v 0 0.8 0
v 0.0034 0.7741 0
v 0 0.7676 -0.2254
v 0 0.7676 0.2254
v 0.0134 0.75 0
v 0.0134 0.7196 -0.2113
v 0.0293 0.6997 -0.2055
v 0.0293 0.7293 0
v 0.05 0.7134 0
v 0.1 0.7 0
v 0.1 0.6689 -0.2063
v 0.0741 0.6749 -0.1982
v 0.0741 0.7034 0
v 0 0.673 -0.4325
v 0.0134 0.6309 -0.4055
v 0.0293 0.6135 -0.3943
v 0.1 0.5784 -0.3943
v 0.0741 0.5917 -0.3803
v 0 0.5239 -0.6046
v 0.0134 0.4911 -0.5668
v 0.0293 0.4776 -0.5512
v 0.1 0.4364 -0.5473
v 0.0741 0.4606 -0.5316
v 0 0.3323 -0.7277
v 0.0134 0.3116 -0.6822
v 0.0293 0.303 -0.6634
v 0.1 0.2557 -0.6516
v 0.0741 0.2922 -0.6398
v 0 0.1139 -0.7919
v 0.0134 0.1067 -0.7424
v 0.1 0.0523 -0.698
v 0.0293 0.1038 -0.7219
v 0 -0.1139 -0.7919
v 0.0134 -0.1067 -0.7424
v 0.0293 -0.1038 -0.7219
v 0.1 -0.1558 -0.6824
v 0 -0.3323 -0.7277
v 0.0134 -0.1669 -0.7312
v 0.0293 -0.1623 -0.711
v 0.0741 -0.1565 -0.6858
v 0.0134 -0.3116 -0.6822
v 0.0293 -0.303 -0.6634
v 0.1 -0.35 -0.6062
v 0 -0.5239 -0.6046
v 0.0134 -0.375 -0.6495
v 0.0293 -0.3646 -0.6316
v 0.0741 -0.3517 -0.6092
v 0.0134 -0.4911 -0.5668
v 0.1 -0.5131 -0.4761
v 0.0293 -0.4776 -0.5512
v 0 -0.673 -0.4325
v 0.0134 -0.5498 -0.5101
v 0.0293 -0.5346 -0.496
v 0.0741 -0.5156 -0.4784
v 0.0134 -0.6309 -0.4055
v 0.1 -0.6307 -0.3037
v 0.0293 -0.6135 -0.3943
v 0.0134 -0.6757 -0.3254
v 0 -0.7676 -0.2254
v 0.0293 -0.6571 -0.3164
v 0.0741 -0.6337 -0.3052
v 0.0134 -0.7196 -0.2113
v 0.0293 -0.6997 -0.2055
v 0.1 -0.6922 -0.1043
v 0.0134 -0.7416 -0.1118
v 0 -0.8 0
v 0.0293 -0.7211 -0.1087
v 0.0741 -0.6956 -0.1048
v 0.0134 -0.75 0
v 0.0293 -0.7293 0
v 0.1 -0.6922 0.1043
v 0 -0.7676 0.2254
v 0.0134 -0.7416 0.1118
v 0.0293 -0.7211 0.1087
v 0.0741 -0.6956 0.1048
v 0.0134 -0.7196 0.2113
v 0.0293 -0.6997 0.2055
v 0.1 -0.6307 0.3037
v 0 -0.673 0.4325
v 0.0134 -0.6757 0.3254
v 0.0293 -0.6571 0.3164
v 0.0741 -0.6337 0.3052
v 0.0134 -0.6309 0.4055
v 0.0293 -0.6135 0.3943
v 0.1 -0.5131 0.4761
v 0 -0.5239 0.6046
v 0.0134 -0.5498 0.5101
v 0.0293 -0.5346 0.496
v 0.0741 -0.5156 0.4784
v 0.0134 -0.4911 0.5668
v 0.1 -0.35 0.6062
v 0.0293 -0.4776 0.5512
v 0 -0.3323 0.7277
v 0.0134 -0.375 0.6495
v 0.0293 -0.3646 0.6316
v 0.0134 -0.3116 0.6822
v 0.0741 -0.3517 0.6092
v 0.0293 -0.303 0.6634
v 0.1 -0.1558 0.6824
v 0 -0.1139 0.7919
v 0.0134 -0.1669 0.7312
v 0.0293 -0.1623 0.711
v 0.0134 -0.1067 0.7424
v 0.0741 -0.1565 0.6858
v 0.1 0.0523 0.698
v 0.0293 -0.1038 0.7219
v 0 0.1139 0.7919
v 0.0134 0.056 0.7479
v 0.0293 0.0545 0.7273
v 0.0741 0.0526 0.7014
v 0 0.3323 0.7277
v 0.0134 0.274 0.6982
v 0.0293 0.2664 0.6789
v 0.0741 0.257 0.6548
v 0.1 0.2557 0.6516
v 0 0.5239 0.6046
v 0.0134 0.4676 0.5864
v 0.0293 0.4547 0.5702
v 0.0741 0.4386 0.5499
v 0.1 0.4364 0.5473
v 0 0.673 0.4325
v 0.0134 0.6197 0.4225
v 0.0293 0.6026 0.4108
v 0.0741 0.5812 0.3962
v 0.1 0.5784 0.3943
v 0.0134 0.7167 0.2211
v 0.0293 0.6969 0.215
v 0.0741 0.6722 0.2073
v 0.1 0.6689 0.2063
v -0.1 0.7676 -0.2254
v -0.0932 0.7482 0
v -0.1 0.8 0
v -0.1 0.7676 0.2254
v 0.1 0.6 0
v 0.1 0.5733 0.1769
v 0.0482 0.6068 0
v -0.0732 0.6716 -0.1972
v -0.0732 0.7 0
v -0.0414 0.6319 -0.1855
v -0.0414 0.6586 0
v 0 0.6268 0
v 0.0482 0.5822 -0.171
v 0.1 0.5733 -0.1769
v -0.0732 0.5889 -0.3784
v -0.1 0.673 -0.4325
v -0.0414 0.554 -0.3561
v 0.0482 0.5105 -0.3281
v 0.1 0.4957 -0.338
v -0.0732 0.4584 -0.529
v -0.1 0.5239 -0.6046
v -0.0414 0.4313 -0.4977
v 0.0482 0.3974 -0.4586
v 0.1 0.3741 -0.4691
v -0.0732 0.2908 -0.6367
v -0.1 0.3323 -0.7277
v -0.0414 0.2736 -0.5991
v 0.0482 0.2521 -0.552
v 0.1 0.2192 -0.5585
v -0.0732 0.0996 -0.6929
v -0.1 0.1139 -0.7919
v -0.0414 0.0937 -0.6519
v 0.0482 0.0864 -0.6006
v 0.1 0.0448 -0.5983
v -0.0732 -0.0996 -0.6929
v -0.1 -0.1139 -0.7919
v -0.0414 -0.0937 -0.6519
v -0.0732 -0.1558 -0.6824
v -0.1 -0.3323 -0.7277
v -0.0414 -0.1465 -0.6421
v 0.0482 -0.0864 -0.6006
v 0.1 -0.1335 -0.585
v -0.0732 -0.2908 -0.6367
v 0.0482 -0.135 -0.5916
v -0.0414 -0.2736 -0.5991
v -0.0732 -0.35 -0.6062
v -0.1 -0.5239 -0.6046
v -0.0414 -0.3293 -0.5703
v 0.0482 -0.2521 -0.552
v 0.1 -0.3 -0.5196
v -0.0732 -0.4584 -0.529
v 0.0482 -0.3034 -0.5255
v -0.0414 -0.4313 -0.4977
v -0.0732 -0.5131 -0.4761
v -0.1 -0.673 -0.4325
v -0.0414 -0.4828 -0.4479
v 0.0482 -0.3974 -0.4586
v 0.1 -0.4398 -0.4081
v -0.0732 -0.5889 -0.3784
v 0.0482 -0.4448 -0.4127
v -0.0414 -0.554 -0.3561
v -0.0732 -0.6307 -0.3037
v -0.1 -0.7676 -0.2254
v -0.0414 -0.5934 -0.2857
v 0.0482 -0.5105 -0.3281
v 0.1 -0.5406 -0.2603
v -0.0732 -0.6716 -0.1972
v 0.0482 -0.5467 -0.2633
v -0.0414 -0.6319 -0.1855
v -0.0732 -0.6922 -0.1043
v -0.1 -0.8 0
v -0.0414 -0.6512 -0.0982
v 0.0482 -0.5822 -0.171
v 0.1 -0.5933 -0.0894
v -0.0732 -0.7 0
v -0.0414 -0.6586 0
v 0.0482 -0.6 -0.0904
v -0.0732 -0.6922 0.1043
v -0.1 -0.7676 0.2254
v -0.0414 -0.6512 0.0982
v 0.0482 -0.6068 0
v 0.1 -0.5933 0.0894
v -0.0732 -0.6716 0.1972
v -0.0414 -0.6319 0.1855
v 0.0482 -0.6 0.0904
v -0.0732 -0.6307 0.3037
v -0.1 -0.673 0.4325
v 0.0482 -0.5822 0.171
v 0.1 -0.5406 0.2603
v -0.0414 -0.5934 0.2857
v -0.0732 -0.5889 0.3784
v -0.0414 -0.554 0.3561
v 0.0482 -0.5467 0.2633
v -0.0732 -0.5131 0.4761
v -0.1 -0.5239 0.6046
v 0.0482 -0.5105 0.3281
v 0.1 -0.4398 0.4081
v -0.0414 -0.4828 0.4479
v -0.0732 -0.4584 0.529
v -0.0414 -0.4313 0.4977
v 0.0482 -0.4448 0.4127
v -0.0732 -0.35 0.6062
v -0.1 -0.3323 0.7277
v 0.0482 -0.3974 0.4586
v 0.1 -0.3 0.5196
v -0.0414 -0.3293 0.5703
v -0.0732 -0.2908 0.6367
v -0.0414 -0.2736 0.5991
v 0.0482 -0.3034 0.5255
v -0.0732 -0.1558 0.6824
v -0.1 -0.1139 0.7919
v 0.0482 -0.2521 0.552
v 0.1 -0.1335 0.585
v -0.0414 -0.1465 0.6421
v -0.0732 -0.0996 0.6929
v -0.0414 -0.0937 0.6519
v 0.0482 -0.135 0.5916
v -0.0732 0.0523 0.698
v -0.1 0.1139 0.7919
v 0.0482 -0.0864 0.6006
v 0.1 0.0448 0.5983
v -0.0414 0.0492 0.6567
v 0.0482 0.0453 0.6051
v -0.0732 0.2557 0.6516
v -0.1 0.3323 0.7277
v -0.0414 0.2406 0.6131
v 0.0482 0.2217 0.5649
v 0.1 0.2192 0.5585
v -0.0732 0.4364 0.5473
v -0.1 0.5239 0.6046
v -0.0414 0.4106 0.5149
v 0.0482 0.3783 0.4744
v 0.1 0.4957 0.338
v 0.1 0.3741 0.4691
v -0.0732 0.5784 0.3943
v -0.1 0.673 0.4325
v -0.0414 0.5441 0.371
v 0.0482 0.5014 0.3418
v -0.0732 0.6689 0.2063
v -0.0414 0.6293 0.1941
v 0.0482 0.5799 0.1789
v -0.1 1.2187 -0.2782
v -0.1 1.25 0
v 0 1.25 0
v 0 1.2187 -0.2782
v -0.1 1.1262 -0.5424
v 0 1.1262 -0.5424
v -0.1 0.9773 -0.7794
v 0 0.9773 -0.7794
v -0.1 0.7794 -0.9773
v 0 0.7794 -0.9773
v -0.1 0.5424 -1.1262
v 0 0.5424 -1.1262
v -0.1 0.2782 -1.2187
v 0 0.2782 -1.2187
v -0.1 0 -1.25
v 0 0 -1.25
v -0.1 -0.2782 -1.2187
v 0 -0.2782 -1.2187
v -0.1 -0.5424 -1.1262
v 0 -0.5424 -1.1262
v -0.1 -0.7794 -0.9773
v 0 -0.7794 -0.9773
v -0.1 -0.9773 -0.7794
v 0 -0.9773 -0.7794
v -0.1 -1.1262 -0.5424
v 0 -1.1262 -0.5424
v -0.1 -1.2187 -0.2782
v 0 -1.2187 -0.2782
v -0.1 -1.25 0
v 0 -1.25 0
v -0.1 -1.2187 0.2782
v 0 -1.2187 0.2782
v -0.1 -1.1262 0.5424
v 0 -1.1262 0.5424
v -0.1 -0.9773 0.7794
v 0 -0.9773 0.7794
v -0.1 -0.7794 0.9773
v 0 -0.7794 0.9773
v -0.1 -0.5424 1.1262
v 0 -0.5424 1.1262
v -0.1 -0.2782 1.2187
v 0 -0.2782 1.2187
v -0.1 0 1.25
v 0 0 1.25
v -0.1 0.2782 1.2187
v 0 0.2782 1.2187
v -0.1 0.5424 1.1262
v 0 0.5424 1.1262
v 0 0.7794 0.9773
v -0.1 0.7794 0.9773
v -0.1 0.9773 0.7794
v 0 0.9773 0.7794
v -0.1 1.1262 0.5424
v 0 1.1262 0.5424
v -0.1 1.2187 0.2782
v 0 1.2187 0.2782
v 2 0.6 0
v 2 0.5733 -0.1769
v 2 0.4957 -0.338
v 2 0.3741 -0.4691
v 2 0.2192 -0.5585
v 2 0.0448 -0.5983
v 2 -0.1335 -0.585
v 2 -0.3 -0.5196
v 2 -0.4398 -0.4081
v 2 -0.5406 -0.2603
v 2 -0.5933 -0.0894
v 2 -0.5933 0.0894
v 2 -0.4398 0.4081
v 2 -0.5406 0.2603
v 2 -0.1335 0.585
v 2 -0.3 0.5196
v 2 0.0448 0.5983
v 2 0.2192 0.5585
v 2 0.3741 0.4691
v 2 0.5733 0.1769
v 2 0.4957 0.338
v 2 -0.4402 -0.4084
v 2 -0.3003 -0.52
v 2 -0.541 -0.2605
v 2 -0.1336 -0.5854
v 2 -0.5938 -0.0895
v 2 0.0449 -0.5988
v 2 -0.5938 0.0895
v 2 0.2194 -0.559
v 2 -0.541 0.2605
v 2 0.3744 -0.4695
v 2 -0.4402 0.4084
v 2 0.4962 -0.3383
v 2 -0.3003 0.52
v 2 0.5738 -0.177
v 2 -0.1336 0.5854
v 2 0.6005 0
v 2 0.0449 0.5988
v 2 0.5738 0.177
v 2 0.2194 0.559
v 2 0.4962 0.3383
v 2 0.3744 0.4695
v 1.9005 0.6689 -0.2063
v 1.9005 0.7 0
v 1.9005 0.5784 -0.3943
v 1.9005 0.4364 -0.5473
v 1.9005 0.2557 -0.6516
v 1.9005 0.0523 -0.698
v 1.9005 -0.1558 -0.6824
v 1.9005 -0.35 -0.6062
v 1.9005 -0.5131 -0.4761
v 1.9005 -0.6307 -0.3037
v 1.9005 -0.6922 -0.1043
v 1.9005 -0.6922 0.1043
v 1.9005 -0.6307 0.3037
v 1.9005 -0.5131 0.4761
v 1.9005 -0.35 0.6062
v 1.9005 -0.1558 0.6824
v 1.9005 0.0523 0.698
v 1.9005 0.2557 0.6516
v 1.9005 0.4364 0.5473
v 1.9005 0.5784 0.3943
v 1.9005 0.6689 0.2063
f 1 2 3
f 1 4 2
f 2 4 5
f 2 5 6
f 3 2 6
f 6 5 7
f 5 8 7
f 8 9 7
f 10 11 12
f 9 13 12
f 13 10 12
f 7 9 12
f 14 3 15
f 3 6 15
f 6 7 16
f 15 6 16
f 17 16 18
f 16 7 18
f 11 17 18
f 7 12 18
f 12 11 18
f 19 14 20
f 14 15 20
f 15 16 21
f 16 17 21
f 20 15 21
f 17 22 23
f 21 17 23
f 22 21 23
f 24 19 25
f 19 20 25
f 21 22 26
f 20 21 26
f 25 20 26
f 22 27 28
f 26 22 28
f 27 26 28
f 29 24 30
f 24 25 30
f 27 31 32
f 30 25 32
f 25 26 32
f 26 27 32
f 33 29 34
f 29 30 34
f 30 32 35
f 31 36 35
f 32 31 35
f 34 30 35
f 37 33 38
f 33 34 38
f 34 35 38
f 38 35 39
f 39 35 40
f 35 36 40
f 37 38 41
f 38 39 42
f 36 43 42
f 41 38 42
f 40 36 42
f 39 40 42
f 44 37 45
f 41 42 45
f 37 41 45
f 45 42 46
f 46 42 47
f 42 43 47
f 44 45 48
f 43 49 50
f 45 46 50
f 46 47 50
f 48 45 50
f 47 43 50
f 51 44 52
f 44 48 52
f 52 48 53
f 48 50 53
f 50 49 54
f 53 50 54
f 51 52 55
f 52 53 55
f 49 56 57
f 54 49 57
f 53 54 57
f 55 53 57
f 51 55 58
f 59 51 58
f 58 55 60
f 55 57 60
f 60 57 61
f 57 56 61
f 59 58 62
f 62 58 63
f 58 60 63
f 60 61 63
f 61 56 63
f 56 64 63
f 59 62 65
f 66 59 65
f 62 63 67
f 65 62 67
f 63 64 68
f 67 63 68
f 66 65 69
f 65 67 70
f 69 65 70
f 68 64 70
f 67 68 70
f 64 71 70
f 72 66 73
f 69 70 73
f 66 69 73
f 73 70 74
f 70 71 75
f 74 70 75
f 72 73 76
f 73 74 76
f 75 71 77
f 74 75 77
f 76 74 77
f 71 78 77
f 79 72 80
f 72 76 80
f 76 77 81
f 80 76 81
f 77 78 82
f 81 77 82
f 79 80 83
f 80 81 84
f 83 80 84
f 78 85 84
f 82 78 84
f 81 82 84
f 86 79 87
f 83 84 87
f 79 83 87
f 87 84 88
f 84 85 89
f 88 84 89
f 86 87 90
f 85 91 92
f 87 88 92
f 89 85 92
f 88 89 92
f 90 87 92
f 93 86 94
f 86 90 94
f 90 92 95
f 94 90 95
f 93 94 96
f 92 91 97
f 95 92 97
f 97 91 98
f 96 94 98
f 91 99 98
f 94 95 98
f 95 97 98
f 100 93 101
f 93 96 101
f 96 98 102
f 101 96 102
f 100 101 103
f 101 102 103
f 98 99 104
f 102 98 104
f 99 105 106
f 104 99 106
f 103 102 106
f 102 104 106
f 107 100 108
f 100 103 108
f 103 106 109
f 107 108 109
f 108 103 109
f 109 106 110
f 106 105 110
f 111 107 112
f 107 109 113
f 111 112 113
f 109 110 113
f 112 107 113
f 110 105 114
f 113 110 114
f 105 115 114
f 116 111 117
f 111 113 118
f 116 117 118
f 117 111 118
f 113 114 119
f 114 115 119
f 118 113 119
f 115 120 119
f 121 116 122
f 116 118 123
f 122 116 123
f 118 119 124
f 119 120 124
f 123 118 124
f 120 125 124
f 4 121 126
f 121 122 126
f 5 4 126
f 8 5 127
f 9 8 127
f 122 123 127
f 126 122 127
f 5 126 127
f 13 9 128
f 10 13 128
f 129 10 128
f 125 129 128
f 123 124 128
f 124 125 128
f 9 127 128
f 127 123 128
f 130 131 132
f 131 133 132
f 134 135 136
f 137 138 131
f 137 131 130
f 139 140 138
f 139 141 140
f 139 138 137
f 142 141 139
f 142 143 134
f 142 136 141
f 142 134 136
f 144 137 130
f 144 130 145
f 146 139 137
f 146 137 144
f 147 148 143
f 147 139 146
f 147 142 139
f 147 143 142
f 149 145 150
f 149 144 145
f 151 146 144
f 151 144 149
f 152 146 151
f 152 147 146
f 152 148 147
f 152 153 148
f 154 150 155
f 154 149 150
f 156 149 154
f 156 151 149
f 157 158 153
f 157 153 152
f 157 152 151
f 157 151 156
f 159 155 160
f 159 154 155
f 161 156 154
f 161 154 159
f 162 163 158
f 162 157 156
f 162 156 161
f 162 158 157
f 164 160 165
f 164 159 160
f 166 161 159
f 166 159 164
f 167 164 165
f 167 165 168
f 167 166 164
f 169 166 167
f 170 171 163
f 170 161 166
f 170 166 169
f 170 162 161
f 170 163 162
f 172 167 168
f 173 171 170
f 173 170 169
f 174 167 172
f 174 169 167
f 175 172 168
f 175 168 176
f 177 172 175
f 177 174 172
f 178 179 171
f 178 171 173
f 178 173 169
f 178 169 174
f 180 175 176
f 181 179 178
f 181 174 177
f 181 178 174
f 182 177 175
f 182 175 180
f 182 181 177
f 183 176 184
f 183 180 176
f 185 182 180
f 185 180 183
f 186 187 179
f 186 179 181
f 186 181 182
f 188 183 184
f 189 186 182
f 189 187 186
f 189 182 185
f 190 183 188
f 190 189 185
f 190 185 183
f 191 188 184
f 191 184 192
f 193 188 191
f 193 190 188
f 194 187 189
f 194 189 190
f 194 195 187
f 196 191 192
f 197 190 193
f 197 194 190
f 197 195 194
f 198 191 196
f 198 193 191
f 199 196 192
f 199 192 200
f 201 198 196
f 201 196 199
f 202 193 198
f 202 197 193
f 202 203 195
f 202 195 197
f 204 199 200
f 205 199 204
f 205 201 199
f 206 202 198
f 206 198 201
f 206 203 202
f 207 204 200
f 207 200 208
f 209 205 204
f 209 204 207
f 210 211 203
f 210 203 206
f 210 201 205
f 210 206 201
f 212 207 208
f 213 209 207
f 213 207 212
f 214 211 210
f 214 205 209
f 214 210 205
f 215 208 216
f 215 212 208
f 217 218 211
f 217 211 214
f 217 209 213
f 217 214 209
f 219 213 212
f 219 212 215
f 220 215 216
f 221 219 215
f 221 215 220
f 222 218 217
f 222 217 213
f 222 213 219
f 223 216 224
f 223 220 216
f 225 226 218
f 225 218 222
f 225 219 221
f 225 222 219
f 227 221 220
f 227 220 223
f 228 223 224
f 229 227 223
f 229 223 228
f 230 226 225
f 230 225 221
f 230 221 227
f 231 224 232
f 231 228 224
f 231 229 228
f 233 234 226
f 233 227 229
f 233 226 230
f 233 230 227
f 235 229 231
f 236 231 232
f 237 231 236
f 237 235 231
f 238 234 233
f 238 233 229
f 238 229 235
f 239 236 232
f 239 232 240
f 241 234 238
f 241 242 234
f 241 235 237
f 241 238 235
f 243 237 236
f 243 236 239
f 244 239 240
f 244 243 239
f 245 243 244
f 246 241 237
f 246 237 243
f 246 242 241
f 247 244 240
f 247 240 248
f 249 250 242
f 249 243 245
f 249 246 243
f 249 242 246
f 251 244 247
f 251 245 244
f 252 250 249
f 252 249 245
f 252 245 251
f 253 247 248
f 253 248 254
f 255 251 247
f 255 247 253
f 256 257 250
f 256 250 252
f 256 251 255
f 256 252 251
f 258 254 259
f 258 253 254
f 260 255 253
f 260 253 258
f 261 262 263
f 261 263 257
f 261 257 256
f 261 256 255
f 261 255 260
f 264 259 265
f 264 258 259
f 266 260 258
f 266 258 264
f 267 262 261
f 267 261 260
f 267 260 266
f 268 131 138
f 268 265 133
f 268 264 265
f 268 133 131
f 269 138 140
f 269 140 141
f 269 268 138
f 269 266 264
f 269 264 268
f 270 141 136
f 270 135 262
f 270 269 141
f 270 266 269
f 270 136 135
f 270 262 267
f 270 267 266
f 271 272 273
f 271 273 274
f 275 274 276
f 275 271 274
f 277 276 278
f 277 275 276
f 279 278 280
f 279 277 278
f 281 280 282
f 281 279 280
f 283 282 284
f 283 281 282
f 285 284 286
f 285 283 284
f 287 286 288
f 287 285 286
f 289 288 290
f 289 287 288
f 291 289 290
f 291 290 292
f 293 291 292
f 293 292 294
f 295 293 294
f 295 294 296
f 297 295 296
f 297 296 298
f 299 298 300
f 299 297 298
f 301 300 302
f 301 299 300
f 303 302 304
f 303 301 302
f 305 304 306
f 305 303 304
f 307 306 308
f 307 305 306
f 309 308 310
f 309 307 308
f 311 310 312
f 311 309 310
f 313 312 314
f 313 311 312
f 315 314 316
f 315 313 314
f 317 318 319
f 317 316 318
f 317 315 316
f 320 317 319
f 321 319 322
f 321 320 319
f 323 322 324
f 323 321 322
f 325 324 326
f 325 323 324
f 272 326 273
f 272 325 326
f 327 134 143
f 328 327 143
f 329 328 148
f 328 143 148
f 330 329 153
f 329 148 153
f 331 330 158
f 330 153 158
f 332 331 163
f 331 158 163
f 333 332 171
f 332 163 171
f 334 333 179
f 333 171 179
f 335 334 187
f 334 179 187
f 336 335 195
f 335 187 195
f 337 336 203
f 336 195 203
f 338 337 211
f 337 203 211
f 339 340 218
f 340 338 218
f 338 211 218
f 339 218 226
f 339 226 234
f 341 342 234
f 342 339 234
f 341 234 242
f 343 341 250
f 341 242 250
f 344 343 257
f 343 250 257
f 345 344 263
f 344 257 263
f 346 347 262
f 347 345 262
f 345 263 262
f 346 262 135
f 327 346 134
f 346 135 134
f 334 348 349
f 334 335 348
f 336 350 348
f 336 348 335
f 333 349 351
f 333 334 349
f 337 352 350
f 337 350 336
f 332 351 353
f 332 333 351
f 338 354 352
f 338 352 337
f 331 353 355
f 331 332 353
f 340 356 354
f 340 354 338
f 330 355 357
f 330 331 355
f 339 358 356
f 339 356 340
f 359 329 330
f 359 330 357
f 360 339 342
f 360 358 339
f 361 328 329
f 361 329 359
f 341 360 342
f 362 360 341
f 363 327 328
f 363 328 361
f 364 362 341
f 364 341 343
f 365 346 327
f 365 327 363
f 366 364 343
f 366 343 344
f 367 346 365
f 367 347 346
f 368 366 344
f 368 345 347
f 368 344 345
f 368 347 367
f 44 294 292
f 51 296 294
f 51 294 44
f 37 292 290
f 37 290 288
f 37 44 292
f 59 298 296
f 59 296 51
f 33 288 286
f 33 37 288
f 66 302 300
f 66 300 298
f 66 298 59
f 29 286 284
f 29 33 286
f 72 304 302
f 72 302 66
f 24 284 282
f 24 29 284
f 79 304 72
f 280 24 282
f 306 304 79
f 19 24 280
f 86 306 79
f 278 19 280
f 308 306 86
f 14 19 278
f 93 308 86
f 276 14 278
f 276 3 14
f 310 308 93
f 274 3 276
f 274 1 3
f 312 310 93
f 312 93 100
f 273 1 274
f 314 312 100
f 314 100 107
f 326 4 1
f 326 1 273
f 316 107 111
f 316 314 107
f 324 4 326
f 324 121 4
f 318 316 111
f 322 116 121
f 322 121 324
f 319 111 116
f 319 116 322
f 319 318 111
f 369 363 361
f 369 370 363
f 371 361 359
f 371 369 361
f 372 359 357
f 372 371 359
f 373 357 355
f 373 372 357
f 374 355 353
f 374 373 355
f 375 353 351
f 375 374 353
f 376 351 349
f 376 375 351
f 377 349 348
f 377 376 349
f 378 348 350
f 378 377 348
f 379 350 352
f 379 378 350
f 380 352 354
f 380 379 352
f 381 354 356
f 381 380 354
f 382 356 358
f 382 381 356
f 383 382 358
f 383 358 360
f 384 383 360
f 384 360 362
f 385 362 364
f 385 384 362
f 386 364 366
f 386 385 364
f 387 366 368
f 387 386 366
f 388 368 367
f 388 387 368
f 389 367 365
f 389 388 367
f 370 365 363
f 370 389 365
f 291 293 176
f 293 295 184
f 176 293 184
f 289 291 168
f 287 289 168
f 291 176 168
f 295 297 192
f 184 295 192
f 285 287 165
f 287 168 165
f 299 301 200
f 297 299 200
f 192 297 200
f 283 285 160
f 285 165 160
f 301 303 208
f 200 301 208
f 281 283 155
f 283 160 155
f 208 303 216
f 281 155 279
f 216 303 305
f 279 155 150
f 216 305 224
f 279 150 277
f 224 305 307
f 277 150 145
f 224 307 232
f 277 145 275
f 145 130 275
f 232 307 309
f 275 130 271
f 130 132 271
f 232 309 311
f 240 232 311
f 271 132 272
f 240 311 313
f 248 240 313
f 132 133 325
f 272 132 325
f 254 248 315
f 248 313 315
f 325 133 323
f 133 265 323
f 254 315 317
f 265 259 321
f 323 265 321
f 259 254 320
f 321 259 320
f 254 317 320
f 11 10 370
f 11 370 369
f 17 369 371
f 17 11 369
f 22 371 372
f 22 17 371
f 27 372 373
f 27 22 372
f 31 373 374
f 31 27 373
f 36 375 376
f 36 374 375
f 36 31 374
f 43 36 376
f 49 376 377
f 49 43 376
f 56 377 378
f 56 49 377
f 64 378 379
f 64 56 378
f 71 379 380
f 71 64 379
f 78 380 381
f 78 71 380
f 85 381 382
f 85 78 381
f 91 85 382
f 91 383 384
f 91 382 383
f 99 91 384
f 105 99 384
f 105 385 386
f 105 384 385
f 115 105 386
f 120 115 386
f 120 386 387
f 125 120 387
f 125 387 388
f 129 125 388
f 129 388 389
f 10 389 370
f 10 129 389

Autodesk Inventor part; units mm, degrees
ref_plane "YZ Plane" through (0, 0, 0) normal (1, 0, 0) x (0, 1, 0)
ref_plane "XZ Plane" through (0, 0, 0) normal (0, 1, 0) x (-1, 0, 0)
ref_plane "XY Plane" through (0, 0, 0) normal (0, 0, 1) x (1, 0, 0)
sketch "Sketch1" plane through (0, 0, 0) normal (0, 0, 1) x (1, 0, 0)
  line L0 (2, 0.7) -> (0.1, 0.7)
  line L1 (0, 0.8) -> (0, 1.25)
  line L2 (0, 1.25) -> (-0.1, 1.25)
  line L3 (0, 0) -> (3.6291, 0)
  arc A0 (0, 0.8) -> (0.1, 0.7) centre (0.1, 0.8) ccw
  line L4 (2, 0.6) -> (0.1, 0.6)
  arc A1 (-0.1, 0.8) -> (0.1, 0.6) centre (0.1, 0.8) ccw
  line L5 (-0.1, 0.8) -> (-0.1, 1.25)
  line L6 (2, 0.7) -> (2, 0.6)
  point P0 (0, 1.025)
  dimension "d4" = 2.5
  dimension "d5" = 0.1
  dimension "d6" = 0.1
  dimension "d7" = 2
  dimension "d8" = 1.4
revolve "Revolution1" add sketch "Sketch1" angle 360 about axis through (0, 0, 0) along (1, 0, 0)
chamfer "Chamfer1" distance 0.1 angle 45 1 edges at (2, -0.7, 0) measured on face at (1.3667, 0.6977, -0.0563)
equation "\"d4\" = D"
equation "\"d5\" = r"
equation "\"d6\" = s_"
equation "\"d7\" = l_"
equation "\"d8\" = d_"
equation "\"d10\" = s_"
equation "\"d_\" = 1.4"
equation "\"D\" = 2.5"
equation "\"s_\" = 0.1"
equation "\"r\" = 0.1"
equation "\"l_\" = 2"
properties part number "Rivet A 1.4x2 GOST 12639-80" material "Steel, Mild"
